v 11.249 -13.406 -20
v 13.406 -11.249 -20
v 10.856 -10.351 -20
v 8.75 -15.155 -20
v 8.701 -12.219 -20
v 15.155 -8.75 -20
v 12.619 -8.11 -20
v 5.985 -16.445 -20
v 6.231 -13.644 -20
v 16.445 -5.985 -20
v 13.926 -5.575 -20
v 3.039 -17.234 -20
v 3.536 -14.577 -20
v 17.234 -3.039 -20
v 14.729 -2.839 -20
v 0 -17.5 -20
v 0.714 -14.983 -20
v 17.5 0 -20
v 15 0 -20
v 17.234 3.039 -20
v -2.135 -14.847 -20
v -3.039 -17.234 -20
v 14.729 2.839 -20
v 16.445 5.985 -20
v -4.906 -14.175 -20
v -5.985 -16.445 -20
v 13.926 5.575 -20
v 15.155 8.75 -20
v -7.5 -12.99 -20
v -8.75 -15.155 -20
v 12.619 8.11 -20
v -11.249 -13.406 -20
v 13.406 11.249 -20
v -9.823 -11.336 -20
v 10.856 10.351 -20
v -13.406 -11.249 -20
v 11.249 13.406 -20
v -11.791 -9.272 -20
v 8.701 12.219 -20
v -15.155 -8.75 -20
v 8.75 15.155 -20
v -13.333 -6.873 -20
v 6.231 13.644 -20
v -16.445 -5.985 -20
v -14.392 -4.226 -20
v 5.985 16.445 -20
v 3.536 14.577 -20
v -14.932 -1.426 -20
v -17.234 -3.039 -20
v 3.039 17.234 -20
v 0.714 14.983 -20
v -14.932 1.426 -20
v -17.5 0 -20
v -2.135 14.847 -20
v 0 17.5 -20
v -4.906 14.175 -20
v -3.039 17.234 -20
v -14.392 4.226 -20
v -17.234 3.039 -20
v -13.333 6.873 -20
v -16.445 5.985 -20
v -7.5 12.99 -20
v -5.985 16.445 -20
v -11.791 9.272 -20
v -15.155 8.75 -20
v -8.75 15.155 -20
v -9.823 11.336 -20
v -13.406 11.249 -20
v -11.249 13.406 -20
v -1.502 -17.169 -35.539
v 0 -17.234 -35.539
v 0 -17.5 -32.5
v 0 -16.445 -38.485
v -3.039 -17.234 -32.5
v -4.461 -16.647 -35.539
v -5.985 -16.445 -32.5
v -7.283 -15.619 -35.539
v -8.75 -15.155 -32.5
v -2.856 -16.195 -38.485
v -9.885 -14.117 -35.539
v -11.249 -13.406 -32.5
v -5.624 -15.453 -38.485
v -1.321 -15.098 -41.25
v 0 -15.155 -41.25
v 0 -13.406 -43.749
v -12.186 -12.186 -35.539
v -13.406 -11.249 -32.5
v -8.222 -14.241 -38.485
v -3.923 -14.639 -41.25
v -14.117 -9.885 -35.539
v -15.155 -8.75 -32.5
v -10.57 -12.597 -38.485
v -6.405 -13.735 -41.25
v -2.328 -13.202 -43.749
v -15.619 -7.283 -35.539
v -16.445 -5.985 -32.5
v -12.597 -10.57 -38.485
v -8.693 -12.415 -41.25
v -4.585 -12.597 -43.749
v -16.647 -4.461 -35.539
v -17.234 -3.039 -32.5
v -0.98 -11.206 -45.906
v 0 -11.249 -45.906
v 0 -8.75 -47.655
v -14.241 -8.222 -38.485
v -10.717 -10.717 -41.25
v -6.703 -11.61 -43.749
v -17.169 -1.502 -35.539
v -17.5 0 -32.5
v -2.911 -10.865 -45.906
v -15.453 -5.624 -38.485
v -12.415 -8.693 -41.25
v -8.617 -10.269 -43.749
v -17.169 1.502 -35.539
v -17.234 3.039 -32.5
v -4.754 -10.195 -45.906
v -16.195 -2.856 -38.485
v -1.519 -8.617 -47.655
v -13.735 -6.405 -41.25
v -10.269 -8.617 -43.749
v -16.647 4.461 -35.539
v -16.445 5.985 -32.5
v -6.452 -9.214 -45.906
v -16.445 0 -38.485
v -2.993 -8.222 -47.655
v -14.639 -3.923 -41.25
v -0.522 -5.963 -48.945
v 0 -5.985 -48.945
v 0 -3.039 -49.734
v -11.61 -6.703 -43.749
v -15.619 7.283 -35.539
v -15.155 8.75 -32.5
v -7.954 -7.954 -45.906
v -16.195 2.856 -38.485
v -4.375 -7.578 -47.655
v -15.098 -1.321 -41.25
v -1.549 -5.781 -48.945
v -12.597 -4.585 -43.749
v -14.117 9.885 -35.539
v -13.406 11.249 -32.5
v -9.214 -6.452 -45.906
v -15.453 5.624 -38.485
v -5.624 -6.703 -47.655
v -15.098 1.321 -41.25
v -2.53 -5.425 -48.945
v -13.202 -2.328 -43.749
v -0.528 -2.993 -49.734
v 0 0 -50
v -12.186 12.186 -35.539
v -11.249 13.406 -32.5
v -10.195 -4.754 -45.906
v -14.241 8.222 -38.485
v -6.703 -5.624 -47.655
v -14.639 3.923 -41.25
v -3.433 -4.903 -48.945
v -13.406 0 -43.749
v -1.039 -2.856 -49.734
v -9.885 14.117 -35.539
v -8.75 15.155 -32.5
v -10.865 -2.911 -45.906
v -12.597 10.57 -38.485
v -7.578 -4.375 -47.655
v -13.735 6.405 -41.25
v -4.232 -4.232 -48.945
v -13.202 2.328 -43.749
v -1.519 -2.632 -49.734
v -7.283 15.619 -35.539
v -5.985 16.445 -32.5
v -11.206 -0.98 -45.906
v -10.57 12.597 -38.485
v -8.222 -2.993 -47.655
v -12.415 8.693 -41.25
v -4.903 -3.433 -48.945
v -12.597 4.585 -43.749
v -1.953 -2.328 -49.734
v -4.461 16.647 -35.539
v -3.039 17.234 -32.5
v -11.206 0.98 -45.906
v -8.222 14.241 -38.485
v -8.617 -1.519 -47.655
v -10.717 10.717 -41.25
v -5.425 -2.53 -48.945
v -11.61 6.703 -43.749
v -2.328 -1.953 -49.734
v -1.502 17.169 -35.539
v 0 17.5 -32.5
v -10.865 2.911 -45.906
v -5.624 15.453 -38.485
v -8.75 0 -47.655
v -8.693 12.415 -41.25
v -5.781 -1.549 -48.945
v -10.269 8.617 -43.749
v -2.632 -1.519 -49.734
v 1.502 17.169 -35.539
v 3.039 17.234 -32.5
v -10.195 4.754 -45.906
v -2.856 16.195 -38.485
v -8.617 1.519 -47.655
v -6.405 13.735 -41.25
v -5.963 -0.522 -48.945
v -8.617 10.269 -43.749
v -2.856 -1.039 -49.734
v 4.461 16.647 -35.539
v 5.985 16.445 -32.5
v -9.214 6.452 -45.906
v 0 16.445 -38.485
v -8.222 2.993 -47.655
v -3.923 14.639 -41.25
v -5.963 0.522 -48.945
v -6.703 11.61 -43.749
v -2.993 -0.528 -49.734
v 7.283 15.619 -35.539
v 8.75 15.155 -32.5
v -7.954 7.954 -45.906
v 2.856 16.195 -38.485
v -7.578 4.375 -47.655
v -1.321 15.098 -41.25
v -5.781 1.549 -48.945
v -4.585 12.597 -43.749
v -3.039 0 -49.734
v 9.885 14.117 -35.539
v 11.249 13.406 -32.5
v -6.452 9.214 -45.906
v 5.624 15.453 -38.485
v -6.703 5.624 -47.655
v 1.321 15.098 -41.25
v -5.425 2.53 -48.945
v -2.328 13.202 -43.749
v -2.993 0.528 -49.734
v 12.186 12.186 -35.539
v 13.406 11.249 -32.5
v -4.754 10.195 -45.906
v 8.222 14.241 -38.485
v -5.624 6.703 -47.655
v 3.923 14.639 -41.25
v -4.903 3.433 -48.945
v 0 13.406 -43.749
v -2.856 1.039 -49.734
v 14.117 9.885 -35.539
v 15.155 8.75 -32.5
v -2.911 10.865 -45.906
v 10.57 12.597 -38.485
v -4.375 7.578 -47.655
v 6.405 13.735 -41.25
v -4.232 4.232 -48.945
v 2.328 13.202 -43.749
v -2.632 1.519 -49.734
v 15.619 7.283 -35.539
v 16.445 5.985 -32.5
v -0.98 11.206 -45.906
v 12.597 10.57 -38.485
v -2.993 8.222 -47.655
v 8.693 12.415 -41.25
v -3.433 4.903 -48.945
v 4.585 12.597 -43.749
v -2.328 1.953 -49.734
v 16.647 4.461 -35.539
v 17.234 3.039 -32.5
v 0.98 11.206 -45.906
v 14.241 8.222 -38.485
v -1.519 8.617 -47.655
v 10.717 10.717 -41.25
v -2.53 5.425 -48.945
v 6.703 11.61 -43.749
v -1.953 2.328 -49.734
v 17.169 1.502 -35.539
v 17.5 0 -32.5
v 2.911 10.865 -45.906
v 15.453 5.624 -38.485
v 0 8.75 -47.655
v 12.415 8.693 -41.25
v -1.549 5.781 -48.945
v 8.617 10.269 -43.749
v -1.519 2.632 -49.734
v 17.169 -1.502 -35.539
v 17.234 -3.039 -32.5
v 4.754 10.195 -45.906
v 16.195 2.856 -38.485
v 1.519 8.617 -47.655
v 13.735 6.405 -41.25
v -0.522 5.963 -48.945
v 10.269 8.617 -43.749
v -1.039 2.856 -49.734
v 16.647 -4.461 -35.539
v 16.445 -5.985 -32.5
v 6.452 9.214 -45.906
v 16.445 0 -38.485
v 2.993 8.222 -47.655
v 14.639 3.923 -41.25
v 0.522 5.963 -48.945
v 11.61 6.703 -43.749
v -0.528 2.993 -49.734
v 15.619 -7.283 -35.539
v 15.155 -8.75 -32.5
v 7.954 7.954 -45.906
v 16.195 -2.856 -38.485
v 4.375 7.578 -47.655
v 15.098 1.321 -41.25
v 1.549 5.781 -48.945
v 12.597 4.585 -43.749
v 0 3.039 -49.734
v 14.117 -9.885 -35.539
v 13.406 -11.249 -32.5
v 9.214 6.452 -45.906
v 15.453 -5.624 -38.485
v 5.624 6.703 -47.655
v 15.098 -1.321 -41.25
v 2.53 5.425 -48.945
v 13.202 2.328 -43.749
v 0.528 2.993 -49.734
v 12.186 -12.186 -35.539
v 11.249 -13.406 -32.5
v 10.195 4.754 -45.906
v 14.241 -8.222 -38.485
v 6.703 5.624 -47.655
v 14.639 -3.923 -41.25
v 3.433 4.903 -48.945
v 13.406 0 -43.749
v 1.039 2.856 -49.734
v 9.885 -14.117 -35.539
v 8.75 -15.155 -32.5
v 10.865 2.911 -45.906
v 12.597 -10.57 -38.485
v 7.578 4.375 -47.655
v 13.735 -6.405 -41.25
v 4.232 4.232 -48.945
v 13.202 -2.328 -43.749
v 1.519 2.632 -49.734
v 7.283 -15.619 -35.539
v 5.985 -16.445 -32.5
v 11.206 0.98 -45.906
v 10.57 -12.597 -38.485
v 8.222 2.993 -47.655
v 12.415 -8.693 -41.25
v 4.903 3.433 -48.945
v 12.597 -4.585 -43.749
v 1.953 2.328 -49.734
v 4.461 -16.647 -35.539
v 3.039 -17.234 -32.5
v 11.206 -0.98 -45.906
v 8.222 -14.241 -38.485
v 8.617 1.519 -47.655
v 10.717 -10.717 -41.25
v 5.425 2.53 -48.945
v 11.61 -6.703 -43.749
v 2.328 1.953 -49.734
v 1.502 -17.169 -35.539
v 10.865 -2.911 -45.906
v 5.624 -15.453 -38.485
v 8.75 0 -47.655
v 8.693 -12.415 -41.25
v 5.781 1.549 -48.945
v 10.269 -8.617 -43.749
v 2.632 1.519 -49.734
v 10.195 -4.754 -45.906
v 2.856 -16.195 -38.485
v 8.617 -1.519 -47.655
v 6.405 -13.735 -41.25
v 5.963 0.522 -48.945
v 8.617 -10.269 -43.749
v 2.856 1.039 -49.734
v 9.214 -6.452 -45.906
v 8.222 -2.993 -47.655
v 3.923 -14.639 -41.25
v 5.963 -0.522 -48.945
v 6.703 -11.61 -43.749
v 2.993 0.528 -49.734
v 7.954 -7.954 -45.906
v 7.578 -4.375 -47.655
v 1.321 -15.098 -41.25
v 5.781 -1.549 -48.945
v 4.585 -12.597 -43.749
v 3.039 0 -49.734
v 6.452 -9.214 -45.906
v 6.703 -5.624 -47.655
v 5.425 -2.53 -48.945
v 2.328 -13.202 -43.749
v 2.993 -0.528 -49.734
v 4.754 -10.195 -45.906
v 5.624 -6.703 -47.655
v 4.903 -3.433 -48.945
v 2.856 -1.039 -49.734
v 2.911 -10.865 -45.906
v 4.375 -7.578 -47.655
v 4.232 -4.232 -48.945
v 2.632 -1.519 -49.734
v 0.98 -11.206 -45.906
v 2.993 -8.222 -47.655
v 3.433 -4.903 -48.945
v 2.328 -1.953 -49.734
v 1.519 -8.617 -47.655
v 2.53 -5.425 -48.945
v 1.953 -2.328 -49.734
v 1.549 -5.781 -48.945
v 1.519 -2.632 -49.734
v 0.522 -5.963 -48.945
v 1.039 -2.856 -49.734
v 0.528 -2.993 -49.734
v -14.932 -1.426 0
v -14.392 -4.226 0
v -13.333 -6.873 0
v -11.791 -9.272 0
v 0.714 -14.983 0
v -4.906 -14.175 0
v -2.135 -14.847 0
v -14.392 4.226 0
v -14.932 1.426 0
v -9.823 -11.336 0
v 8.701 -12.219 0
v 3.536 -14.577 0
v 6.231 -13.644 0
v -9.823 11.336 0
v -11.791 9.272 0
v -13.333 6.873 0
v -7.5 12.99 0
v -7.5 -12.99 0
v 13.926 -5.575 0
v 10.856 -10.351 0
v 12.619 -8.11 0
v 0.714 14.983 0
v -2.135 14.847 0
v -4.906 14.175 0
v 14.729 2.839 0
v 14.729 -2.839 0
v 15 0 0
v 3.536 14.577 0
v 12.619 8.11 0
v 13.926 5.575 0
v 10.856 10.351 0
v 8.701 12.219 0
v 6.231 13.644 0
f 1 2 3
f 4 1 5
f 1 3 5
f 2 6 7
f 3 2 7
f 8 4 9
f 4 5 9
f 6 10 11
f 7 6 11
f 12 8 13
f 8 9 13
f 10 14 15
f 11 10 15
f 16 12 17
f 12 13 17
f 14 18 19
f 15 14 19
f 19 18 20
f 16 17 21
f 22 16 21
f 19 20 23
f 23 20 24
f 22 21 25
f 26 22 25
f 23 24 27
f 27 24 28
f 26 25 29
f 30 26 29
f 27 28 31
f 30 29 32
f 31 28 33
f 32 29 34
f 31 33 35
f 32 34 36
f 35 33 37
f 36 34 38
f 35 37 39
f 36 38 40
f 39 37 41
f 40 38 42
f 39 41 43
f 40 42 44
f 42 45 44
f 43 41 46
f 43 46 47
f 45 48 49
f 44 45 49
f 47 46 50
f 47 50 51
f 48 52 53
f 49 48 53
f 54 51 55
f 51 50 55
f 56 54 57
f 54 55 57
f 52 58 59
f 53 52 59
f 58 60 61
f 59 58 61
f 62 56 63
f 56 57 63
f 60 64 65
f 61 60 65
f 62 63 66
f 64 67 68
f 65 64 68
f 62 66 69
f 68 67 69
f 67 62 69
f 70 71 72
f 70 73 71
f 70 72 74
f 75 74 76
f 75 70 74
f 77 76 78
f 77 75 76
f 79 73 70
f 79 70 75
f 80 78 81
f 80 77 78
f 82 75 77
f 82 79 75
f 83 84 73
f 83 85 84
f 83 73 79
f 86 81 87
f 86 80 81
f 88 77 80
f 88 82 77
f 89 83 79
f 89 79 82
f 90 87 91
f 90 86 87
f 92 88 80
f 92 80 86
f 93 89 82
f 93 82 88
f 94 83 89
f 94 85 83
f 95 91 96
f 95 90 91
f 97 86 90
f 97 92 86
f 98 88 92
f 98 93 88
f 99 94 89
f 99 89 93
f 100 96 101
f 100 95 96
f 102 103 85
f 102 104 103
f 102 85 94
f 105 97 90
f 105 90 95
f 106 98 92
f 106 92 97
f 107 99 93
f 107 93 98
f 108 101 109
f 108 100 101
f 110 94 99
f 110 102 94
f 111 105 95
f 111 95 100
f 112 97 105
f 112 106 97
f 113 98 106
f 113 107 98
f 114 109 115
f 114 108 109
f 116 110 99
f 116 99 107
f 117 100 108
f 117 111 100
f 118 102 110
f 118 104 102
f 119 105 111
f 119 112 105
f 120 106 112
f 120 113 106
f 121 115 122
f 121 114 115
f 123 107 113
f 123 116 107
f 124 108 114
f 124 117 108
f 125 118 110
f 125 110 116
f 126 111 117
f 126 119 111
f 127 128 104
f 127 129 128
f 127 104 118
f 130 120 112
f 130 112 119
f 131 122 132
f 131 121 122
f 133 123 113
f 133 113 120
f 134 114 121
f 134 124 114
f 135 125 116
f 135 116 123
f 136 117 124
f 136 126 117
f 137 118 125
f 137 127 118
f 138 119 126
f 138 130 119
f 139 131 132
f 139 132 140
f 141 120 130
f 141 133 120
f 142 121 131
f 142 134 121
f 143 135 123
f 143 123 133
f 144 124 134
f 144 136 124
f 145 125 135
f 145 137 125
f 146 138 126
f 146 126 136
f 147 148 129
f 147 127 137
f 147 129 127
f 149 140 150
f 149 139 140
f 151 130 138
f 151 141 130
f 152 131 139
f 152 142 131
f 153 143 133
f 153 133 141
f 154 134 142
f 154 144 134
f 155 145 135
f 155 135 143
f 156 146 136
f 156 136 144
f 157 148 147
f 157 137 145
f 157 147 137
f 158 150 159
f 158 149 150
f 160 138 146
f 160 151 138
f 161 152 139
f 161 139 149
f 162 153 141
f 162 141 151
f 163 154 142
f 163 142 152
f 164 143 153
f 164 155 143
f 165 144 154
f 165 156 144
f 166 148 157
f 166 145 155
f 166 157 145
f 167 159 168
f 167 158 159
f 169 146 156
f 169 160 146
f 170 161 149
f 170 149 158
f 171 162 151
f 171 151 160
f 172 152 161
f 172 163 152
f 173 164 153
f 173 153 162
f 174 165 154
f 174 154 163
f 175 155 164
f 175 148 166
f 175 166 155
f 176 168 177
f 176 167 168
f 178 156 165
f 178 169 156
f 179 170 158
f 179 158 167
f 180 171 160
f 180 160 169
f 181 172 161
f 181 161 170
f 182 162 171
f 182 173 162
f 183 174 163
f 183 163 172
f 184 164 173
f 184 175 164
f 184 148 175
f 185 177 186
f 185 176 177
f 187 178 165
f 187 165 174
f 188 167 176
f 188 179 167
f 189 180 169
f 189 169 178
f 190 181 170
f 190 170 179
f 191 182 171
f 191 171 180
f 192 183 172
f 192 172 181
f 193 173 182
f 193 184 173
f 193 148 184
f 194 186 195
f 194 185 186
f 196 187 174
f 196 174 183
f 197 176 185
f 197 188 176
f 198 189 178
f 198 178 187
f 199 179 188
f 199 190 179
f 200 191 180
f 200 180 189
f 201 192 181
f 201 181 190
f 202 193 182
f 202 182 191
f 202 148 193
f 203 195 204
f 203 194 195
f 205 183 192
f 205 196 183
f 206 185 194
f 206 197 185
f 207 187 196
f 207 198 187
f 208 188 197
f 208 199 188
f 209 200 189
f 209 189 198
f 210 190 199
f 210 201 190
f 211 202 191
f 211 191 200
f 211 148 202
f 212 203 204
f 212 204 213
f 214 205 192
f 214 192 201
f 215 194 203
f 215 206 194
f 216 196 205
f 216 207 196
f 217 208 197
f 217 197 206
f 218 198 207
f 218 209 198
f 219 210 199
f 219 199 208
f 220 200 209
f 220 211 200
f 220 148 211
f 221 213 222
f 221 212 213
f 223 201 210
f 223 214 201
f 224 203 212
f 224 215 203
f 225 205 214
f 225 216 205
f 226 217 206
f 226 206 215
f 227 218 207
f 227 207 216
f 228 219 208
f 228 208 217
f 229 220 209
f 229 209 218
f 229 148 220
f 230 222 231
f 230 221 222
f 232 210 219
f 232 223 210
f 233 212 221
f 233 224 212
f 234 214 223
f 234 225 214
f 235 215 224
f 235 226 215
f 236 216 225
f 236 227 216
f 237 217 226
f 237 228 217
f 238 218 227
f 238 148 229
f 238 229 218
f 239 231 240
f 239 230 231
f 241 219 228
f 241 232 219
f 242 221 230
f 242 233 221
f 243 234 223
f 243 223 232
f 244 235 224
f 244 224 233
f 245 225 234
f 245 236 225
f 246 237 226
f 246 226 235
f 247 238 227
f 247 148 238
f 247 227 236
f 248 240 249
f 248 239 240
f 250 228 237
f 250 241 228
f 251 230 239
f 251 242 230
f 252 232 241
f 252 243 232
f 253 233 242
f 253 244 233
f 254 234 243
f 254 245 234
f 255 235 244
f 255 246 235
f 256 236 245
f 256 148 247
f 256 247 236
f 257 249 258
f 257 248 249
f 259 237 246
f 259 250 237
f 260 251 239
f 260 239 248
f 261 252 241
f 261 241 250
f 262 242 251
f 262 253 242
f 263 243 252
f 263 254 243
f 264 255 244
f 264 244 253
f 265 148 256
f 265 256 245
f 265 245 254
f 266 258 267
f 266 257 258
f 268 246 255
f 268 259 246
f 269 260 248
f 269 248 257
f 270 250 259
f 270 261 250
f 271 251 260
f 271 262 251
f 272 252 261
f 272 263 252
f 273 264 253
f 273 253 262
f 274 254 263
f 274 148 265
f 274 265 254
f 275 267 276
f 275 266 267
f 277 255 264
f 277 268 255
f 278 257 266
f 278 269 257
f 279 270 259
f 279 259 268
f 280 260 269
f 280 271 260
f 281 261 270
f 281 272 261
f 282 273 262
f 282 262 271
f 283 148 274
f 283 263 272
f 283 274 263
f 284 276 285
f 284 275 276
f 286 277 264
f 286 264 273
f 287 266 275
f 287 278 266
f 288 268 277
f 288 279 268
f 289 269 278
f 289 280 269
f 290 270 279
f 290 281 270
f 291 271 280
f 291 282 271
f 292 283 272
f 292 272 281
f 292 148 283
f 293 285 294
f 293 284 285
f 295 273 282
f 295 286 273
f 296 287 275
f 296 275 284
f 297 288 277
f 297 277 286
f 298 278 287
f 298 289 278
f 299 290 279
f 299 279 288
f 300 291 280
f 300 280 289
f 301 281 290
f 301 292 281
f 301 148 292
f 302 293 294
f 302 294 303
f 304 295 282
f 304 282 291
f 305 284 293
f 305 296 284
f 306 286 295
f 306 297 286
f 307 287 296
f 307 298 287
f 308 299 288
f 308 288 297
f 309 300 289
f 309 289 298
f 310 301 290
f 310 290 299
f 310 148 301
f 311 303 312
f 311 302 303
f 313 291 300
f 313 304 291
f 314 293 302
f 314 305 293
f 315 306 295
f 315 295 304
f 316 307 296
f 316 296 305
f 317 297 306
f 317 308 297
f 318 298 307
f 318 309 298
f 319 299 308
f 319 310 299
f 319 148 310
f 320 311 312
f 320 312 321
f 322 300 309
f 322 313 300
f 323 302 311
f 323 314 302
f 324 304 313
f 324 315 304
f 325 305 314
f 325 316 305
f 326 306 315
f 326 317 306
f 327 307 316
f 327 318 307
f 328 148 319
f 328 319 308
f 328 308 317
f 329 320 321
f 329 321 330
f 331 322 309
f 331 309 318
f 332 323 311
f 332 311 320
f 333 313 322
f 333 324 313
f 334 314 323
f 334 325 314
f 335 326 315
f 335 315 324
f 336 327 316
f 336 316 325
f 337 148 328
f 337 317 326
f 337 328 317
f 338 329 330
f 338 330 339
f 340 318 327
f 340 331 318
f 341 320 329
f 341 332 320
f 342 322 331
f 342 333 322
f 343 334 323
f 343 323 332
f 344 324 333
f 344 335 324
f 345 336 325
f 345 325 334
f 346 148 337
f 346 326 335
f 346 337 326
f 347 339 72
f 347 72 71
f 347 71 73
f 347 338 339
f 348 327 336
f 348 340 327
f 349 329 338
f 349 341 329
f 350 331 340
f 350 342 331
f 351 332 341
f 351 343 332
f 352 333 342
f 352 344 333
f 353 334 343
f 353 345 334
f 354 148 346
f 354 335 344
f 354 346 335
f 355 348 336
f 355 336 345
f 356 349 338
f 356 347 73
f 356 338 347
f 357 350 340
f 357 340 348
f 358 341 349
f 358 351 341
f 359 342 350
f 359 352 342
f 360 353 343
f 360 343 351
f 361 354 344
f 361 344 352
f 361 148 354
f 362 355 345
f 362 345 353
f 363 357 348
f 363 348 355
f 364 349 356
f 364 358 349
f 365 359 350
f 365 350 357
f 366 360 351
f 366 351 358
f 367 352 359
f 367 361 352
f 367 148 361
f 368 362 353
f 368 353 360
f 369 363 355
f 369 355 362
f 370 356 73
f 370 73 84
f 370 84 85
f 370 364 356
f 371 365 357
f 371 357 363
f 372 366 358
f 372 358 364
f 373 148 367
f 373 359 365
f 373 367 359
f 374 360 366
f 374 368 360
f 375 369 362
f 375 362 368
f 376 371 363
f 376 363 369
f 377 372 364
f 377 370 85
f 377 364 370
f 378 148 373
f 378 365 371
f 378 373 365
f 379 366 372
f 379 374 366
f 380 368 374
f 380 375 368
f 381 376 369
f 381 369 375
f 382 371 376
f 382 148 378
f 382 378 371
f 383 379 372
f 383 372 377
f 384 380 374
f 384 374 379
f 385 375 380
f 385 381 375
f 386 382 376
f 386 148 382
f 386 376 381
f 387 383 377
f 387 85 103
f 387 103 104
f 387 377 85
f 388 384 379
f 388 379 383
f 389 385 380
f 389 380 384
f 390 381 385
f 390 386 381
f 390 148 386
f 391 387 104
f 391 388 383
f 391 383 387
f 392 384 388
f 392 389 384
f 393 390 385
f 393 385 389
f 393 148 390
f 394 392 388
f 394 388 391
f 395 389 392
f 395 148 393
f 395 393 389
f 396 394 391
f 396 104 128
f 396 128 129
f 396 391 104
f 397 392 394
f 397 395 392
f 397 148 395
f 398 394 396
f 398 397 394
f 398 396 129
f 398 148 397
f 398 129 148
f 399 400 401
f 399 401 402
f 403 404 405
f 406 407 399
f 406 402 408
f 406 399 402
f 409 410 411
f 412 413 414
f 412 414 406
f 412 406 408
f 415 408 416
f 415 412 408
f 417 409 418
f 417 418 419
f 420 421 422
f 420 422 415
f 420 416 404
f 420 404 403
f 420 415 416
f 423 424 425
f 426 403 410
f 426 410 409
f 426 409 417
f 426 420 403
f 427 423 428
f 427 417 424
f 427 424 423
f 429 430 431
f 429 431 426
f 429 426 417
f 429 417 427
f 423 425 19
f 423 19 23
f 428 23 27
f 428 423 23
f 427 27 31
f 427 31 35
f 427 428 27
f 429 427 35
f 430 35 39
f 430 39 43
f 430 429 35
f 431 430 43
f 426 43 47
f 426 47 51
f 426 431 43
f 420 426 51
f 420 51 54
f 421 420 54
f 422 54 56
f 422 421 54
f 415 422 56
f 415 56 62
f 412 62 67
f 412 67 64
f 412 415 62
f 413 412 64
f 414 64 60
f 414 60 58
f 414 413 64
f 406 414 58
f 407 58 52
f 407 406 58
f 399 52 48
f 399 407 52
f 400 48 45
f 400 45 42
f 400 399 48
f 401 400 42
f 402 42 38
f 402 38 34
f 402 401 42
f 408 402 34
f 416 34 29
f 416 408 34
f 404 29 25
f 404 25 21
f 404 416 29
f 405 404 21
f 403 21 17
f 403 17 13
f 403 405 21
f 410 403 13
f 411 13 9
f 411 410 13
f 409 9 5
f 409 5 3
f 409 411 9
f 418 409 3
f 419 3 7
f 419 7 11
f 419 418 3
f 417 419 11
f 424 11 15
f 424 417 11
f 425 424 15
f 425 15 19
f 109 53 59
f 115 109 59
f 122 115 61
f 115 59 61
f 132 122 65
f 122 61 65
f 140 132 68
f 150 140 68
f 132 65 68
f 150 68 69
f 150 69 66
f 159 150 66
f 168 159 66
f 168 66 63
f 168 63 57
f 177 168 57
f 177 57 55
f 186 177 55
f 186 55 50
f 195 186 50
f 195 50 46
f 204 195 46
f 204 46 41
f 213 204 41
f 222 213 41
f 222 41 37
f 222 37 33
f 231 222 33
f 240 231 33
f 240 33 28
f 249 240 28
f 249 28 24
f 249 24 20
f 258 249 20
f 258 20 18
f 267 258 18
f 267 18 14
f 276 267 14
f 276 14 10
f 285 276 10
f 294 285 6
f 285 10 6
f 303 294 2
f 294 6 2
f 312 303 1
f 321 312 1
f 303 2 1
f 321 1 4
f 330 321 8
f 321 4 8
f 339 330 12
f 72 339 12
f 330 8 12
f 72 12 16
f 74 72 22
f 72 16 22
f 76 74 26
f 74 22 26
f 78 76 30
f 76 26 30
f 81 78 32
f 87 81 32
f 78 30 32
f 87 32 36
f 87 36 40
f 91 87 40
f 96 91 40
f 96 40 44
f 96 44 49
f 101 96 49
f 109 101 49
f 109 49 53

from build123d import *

# Parameters (mm, degrees)
IZIM3_R                     = 15
Y_KSEKLIK_EKSTR_ZYON1_DEPTH = 20
IZIM4_R                     = 17.5
Y_KSEKLIK_EKSTR_ZYON2_DEPTH = 12.5


with BuildPart() as part:
    # Çizim3 → Yükseklik-Ekstrüzyon1 (new body)
    with BuildSketch(Plane.XY):
        Circle(IZIM3_R)
    extrude(amount=-Y_KSEKLIK_EKSTR_ZYON1_DEPTH)

    # Çizim4 → Yükseklik-Ekstrüzyon2 (add)
    with BuildSketch(Plane(origin=(0, 0, -20), x_dir=(-1, 0, 0), z_dir=(0, 0, -1))):
        Circle(IZIM4_R)
    extrude(amount=Y_KSEKLIK_EKSTR_ZYON2_DEPTH)

    # Çizim5 → Döndür4 (revolve)
    with BuildSketch(Plane(origin=(0, 0, 0), x_dir=(0, 0, -1), z_dir=(1, 0, 0))):
        with BuildLine():
            Line((50, 0), (32.5, 0))
            Line((32.5, 0), (32.5, -17.5))
            ThreePointArc((32.5, -17.5), (44.874368671, -12.374368671), (50, 0))
        make_face()
    revolve(axis=Axis((0, 0, -32.5), (0, 0, -1)))


solid = part.part
